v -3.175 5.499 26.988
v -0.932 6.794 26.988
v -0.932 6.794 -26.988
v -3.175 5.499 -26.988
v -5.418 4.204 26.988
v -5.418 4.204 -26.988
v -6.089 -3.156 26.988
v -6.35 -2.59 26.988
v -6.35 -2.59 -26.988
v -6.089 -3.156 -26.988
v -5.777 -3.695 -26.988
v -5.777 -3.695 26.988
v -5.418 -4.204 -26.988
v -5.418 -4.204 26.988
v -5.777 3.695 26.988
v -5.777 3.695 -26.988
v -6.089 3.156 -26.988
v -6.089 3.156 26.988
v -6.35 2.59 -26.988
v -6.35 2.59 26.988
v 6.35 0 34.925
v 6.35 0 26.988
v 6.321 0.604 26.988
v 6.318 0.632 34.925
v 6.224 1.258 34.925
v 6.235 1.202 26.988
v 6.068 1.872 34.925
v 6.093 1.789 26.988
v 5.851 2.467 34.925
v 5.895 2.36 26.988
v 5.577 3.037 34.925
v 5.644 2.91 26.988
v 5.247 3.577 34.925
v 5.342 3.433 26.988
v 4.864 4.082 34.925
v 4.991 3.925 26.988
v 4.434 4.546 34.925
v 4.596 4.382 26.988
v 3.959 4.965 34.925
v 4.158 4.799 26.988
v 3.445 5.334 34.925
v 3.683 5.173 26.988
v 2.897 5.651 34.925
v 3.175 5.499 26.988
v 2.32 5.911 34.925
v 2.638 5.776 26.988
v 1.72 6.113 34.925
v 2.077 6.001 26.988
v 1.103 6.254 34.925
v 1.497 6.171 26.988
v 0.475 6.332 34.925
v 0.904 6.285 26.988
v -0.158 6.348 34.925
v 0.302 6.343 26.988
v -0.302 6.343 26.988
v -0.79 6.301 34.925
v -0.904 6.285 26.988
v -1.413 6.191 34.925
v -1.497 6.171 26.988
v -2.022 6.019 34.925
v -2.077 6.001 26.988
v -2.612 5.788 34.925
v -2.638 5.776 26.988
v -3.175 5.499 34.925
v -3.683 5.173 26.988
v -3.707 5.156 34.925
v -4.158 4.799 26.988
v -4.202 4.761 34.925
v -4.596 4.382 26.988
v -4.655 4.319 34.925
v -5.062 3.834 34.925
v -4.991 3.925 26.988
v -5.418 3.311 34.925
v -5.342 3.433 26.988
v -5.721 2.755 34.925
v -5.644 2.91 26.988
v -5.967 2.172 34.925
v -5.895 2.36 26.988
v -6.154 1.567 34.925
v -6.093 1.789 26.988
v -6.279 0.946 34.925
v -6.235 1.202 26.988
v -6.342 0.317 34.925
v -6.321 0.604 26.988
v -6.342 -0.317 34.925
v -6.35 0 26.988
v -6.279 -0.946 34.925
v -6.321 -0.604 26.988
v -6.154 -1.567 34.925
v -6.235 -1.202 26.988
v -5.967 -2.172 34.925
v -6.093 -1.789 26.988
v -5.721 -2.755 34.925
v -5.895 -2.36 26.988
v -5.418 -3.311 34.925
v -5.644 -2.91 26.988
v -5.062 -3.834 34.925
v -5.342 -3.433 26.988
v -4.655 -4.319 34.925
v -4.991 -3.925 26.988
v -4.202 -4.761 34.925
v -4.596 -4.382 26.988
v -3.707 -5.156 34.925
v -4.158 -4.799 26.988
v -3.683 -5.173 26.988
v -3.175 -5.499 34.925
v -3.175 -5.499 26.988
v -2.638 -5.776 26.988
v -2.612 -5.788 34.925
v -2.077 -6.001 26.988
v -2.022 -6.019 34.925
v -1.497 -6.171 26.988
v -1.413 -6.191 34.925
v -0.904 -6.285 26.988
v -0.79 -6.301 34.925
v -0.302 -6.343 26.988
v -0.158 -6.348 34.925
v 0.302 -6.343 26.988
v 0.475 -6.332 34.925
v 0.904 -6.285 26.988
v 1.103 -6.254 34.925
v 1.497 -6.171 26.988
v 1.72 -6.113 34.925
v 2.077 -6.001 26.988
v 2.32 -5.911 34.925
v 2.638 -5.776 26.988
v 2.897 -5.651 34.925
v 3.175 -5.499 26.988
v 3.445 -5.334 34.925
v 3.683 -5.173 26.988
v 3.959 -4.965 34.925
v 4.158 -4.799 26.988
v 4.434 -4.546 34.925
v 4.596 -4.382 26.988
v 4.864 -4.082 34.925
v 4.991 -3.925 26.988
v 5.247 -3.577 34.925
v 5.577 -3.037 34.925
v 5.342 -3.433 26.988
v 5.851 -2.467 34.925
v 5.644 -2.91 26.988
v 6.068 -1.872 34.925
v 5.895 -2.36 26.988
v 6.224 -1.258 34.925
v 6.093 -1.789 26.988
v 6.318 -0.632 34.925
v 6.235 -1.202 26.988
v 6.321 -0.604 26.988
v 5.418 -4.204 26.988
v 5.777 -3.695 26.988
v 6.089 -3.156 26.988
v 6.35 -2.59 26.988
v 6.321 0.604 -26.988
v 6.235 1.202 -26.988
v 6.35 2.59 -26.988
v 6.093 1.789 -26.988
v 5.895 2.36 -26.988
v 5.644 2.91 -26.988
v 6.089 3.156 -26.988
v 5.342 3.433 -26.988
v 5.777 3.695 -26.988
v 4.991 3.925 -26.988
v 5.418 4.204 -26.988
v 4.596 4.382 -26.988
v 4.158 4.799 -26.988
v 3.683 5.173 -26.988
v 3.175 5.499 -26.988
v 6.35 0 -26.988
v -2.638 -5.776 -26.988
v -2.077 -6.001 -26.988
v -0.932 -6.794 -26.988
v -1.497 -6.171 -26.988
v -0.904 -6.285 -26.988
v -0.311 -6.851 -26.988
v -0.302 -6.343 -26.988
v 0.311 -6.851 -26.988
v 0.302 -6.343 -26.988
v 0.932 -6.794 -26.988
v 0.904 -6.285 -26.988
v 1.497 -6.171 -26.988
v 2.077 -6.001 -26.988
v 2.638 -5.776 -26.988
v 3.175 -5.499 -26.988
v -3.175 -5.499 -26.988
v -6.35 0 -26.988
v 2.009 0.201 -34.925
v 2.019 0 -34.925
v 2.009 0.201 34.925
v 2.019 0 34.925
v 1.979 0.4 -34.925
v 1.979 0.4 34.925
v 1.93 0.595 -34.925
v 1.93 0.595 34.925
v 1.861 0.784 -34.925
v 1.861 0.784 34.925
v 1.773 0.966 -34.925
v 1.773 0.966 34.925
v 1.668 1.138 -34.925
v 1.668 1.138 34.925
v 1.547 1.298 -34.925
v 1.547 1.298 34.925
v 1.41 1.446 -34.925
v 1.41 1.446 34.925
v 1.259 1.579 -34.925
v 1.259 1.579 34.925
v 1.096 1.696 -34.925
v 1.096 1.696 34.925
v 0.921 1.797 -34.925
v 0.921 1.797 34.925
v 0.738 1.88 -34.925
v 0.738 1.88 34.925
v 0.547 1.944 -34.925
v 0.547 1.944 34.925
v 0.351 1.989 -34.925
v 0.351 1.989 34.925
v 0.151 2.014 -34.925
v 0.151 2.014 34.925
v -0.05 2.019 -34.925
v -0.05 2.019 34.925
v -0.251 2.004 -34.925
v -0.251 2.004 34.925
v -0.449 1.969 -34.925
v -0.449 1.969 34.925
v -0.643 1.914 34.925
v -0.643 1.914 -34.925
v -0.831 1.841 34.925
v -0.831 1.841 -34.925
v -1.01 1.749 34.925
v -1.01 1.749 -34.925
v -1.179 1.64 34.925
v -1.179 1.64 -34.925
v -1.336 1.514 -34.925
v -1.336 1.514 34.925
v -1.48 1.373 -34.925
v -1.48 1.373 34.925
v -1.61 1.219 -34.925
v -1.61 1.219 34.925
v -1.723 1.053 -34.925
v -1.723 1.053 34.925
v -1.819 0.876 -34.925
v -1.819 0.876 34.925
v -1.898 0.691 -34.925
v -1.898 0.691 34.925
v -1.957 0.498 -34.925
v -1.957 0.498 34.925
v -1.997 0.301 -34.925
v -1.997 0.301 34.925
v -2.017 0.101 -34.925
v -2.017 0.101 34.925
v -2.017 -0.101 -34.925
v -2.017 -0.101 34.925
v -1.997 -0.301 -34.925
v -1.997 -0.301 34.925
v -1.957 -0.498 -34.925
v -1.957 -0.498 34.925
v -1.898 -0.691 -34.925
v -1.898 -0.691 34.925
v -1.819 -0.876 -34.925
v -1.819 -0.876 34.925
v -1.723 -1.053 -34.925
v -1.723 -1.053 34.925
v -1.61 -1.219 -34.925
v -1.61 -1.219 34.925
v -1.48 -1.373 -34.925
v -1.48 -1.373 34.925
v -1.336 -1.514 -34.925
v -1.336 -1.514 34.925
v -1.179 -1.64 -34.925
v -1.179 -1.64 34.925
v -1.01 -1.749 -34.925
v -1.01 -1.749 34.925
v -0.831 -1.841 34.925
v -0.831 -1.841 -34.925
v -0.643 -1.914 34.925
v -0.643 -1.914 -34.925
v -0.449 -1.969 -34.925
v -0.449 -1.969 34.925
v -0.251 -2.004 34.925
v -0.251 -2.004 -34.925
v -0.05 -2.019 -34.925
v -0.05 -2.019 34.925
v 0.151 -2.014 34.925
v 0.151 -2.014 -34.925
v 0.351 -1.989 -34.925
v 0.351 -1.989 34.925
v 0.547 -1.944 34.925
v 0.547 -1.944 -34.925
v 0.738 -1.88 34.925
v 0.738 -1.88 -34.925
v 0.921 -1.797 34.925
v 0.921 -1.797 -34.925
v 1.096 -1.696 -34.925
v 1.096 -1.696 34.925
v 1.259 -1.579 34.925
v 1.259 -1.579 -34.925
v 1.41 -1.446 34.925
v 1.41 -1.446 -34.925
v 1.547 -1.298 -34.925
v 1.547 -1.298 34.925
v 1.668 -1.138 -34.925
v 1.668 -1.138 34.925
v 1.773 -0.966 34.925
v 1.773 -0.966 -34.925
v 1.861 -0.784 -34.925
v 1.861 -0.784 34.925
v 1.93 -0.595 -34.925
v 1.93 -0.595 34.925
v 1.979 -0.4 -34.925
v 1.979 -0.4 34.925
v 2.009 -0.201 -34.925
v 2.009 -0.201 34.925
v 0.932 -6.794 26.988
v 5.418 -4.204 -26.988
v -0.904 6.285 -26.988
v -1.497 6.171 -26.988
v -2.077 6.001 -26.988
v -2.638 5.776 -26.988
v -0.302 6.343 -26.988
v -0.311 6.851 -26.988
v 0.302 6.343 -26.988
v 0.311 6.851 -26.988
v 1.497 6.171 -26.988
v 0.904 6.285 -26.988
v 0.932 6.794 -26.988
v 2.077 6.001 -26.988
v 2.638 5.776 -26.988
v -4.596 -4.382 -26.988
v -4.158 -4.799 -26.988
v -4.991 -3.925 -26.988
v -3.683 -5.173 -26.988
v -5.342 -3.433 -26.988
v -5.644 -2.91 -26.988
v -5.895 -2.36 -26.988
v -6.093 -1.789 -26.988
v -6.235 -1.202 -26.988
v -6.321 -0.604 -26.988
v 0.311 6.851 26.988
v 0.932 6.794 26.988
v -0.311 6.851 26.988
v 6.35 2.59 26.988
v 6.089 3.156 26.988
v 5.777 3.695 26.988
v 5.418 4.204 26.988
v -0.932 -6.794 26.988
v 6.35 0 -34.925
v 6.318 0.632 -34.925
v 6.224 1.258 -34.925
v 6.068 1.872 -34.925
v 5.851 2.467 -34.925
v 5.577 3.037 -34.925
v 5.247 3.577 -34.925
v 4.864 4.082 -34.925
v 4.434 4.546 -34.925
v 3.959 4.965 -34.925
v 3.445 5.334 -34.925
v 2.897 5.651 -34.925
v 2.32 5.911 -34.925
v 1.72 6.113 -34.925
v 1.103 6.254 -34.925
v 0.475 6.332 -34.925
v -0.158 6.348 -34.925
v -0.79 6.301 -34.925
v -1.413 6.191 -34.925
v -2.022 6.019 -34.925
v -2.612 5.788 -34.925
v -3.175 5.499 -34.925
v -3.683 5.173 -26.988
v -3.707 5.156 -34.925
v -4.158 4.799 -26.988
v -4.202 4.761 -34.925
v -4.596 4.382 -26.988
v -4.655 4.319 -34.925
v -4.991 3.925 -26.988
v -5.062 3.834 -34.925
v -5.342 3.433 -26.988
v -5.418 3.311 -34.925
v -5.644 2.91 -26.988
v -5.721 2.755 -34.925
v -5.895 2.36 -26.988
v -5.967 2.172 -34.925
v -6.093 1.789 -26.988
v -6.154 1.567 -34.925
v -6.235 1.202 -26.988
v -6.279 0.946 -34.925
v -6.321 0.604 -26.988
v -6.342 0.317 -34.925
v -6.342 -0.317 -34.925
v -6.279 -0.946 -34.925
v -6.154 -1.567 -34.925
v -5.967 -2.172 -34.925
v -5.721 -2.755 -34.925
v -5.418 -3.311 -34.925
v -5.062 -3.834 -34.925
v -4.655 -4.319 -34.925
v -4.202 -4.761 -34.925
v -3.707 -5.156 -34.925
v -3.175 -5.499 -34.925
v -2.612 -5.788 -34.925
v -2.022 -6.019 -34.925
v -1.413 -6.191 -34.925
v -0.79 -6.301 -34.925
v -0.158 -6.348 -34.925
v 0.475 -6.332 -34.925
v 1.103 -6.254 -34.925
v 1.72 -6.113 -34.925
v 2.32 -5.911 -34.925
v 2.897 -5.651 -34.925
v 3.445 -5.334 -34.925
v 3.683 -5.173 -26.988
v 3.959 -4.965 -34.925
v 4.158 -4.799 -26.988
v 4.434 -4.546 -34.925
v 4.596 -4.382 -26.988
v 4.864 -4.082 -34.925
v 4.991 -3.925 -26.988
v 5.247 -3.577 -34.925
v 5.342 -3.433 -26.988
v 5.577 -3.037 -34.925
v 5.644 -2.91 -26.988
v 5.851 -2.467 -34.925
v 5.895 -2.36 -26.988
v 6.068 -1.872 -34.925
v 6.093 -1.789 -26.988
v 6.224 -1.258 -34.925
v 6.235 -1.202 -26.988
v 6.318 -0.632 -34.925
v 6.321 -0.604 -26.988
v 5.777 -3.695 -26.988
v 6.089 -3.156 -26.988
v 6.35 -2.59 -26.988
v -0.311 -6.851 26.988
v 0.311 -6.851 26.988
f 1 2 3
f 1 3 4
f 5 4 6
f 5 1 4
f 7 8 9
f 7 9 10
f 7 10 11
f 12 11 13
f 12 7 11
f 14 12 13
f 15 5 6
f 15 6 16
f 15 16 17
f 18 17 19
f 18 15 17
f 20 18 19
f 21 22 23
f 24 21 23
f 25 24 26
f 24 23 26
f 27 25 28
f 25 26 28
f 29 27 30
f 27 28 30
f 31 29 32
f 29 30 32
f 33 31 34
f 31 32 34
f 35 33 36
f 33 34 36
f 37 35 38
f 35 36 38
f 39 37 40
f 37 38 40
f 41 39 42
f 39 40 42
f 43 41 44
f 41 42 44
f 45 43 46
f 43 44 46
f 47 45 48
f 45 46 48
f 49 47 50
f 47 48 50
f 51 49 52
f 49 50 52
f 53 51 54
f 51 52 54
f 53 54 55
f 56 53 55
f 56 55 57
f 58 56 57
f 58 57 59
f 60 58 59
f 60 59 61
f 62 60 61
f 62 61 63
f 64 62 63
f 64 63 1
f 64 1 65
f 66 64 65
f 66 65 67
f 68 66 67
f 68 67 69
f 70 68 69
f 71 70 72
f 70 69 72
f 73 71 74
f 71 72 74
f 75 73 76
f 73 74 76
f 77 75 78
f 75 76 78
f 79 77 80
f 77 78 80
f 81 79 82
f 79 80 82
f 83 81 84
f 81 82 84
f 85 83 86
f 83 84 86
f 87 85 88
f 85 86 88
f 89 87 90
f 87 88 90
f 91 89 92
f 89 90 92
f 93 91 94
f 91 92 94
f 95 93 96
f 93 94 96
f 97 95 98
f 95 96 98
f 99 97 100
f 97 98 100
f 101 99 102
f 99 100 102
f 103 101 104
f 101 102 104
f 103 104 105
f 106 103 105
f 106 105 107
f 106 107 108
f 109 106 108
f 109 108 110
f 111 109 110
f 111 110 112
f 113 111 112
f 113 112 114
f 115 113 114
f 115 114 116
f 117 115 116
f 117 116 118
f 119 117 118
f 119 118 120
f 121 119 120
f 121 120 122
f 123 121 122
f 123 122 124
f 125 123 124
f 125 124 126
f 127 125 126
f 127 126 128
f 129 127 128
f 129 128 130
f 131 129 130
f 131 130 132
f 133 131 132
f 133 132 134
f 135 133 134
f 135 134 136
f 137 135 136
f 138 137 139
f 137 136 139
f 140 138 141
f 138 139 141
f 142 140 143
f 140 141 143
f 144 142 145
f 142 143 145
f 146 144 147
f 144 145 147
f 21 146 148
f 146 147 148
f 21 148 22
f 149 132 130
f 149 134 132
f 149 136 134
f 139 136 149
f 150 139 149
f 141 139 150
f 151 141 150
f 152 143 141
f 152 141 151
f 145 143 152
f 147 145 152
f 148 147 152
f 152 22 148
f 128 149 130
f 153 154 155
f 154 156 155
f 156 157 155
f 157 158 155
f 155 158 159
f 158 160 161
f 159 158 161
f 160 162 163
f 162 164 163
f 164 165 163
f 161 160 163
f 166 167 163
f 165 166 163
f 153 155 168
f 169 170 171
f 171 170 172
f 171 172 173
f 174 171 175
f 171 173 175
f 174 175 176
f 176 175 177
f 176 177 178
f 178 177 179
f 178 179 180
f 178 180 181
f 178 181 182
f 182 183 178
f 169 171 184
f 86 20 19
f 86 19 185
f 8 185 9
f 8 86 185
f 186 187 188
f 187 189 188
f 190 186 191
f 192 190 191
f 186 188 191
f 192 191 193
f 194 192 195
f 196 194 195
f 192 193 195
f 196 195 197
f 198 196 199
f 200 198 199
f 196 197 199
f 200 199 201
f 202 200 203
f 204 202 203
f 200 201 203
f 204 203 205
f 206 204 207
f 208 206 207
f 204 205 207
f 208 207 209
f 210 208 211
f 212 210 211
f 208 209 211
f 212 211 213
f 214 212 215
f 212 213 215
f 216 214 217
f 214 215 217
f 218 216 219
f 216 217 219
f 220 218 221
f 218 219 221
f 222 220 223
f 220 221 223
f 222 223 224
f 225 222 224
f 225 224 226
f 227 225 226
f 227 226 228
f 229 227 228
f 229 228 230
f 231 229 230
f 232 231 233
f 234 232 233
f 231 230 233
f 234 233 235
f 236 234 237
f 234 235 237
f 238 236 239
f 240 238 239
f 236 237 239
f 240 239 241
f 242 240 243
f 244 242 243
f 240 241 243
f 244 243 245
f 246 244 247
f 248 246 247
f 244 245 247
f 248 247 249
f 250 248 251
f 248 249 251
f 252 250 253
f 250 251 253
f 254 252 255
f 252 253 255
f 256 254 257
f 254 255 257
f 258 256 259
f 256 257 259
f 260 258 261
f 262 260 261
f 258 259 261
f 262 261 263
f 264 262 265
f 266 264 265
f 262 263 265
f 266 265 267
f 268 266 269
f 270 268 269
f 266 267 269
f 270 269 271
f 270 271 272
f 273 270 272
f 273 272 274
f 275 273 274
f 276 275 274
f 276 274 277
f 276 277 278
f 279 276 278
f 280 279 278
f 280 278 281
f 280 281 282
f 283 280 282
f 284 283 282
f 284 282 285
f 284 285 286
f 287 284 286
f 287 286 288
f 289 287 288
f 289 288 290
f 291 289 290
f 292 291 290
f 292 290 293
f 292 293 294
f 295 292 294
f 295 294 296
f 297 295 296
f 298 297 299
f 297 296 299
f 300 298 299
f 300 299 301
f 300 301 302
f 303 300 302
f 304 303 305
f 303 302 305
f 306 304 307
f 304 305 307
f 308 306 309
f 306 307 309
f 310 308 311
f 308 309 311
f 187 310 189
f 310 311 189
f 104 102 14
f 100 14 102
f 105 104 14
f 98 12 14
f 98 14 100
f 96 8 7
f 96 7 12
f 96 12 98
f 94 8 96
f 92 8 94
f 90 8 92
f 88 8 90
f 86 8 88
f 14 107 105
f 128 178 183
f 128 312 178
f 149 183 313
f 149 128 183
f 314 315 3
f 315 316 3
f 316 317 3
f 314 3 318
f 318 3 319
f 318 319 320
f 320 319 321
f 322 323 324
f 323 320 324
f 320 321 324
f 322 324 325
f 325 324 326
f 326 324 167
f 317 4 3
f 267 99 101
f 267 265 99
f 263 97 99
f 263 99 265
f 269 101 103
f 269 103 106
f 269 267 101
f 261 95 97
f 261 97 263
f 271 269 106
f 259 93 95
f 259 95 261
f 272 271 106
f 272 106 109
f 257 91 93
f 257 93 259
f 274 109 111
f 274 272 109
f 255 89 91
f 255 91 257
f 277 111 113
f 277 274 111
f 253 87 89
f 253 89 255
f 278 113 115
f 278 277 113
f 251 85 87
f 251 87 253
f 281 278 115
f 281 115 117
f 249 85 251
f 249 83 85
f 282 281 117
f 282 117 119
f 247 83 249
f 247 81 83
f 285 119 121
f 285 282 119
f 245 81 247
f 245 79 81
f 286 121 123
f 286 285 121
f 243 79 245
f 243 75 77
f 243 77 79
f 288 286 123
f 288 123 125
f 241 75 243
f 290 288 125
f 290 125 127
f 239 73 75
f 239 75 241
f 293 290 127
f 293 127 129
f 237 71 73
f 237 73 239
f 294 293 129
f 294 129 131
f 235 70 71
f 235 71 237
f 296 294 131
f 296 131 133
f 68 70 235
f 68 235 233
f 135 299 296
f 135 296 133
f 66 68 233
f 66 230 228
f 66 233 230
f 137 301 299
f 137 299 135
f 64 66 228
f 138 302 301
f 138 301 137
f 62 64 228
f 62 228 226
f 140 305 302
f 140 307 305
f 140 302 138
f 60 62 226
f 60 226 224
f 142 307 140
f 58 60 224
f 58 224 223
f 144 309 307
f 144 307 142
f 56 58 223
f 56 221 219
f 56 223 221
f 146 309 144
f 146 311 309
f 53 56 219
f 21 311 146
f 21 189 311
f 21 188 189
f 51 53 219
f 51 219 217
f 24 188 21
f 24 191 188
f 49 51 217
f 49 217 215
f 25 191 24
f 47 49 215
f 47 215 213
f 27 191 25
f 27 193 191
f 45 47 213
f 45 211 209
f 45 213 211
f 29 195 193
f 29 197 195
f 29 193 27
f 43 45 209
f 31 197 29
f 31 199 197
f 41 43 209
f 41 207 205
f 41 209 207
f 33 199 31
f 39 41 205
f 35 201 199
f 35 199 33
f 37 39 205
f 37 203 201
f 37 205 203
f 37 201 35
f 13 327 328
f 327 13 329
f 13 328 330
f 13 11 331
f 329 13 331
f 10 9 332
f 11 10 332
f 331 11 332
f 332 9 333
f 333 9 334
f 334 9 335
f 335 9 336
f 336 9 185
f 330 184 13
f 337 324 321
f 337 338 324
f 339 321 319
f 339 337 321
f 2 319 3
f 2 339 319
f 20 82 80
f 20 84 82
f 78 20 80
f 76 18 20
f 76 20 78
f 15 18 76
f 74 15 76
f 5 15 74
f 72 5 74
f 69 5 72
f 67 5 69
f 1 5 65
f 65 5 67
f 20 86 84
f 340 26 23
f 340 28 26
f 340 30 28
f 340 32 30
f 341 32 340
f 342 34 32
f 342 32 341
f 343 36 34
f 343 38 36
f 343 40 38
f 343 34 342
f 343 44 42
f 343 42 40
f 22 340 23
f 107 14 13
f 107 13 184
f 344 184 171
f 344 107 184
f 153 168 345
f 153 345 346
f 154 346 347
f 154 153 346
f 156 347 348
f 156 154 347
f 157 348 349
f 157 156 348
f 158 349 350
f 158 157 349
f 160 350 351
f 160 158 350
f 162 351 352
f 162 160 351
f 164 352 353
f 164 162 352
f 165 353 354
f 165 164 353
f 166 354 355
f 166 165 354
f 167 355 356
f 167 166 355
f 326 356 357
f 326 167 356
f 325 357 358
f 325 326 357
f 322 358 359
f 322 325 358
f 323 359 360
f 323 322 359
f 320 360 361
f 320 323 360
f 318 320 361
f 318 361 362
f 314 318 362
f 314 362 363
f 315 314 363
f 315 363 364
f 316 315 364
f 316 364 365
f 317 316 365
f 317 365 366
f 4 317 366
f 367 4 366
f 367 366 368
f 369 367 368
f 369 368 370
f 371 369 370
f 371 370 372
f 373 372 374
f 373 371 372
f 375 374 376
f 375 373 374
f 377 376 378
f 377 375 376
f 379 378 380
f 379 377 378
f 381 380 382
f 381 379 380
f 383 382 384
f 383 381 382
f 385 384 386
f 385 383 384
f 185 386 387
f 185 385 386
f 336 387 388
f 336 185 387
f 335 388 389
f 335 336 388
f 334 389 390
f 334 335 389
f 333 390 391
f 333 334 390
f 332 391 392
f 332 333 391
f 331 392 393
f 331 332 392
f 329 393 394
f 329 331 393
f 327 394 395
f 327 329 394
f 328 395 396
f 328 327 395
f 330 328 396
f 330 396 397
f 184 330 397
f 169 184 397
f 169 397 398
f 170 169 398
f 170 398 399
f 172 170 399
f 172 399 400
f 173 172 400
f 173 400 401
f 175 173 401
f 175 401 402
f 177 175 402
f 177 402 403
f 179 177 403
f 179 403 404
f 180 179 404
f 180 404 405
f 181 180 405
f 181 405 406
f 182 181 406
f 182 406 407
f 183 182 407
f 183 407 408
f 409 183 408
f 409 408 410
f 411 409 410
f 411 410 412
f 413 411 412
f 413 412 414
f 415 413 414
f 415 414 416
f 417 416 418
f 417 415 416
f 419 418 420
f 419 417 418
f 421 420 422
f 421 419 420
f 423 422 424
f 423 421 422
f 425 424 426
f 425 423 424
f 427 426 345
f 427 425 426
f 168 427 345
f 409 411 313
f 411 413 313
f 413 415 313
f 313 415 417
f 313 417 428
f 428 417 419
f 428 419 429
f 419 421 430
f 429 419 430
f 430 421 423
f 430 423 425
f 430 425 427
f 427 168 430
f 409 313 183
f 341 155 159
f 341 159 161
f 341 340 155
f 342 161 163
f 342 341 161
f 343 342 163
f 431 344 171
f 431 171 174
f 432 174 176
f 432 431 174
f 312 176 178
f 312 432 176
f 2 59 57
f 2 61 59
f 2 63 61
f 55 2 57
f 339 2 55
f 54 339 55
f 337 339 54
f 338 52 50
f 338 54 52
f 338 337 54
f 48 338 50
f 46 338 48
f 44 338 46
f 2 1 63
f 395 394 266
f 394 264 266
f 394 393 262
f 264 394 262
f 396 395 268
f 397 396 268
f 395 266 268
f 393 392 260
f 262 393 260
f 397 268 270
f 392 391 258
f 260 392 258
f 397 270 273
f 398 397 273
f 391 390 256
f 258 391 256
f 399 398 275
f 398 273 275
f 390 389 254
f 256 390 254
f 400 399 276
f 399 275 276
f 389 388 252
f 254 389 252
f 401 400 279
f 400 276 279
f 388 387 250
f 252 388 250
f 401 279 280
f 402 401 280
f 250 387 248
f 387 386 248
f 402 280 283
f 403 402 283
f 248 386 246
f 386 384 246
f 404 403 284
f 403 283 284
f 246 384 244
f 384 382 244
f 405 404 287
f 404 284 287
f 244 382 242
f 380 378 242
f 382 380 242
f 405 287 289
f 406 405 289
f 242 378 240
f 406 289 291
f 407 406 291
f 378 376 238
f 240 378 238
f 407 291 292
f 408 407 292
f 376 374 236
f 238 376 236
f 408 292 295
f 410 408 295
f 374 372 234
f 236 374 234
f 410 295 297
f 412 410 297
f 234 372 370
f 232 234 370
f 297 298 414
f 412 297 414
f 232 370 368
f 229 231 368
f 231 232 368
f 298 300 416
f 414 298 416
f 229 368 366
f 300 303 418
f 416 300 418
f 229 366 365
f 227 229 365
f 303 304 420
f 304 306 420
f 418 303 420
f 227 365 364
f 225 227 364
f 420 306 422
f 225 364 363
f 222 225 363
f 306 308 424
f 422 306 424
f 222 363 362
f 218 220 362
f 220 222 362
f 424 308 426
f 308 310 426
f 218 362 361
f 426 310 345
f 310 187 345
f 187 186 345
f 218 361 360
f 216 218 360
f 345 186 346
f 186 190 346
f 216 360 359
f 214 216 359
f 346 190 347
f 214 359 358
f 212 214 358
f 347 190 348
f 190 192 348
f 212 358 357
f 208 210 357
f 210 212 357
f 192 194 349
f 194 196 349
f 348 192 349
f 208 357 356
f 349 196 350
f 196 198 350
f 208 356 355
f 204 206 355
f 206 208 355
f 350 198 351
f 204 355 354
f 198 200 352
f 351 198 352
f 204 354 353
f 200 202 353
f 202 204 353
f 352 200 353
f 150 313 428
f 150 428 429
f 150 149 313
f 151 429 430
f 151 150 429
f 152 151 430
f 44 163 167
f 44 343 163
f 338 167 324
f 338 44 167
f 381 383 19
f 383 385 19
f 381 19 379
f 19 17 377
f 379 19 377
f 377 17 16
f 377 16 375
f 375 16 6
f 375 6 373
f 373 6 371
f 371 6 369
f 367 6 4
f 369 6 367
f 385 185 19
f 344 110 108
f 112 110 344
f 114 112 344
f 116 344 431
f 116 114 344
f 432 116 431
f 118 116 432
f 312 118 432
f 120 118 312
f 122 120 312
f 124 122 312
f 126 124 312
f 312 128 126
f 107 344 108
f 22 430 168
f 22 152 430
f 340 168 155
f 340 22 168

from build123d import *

# Parameters (mm, degrees)
SKETCH1_R           = 2.0193
BOSS_EXTRUDE1_DEPTH = 26.9875
SKETCH2_R           = 6.35
SKETCH2_R_2         = 2.0193
BOSS_EXTRUDE2_DEPTH = 7.9375


with BuildPart() as part:
    # Sketch1 → Boss-Extrude1 (new, symmetric)
    with BuildSketch(Plane.XY):
        with BuildLine():
            ThreePointArc((0.93173274, 6.79441227), (0, 6.858), (-0.93173274, 6.79441227))
            Line((-0.93173274, 6.79441227), (-5.41826726, 4.204110358))
            ThreePointArc((-5.41826726, 4.204110358), (-5.939202219, 3.429), (-6.35, 2.590301913))
            Line((-6.35, 2.590301913), (-6.35, -2.590301913))
            ThreePointArc((-6.35, -2.590301913), (-5.939202219, -3.429), (-5.41826726, -4.204110358))
            Line((-5.41826726, -4.204110358), (-0.93173274, -6.79441227))
            ThreePointArc((-0.93173274, -6.79441227), (0, -6.858), (0.93173274, -6.79441227))
            Line((0.93173274, -6.79441227), (5.41826726, -4.204110358))
            ThreePointArc((5.41826726, -4.204110358), (5.939202219, -3.429), (6.35, -2.590301913))
            Line((6.35, -2.590301913), (6.35, 2.590301913))
            ThreePointArc((6.35, 2.590301913), (5.939202219, 3.429), (5.41826726, 4.204110358))
            Line((5.41826726, 4.204110358), (0.93173274, 6.79441227))
        make_face()
        Circle(SKETCH1_R, mode=Mode.SUBTRACT)
    extrude(amount=BOSS_EXTRUDE1_DEPTH, both=True)

    # Sketch2 → Boss-Extrude2 (add)
    with BuildSketch(Plane.XY.offset(26.9875)):
        Circle(SKETCH2_R)
        Circle(SKETCH2_R_2, mode=Mode.SUBTRACT)
    boss_extrude2 = extrude(amount=BOSS_EXTRUDE2_DEPTH)

    # Mirror1: Boss-Extrude2 across plane
    add(boss_extrude2.mirror(Plane.XY))


solid = part.part
